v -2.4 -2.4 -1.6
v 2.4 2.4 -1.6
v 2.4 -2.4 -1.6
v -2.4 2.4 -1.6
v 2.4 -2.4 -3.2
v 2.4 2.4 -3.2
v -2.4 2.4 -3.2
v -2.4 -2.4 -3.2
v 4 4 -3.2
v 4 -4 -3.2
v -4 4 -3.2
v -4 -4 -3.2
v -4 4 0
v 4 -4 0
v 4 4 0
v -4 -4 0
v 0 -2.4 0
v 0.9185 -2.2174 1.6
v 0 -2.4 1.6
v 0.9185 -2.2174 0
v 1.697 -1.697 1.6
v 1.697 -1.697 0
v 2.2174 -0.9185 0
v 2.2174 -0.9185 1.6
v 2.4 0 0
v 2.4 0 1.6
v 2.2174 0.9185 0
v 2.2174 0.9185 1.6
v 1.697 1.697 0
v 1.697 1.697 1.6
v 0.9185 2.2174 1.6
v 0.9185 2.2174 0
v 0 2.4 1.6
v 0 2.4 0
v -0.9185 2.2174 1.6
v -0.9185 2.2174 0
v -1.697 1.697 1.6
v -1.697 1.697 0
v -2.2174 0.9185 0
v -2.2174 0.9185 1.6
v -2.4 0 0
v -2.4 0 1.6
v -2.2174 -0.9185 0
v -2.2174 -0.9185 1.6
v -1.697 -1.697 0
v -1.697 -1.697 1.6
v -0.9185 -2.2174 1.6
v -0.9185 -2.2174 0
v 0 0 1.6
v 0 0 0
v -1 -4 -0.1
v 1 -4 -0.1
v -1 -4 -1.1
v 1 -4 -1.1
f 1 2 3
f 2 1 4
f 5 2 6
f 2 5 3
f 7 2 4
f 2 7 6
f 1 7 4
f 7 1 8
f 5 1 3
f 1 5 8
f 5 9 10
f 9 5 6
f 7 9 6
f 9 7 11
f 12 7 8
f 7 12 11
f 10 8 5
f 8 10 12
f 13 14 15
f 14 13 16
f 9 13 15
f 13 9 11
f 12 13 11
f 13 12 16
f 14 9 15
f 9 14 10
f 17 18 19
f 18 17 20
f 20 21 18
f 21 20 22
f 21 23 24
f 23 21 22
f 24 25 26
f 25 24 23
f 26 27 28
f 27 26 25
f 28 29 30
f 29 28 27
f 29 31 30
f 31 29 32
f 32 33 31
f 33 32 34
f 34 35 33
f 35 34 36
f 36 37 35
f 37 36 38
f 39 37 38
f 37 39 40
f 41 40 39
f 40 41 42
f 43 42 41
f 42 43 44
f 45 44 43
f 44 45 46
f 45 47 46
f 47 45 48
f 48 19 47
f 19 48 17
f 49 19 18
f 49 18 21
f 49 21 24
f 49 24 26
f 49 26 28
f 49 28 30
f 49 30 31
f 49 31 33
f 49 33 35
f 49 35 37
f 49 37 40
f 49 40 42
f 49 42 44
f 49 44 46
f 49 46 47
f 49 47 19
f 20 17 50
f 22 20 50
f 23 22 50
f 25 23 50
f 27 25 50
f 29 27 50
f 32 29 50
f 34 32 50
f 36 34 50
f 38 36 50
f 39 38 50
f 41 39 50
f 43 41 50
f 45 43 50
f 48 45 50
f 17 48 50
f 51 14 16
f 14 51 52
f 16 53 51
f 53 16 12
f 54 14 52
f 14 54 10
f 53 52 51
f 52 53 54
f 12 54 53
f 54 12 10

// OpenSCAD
// file: ../p/4-4edge.scad
use <../lib.scad>
function ldraw_lib__4_4edge() = [
// 0 Circle 1.0
// 0 Name: 4-4edge.dat
// 0 Author: James Jessiman
// 0 !LDRAW_ORG Primitive UPDATE 2017-01
// 0 !LICENSE Licensed under CC BY 2.0 and CC BY 4.0 : see CAreadme.txt
// 
// 0 BFC CERTIFY CCW
  [0,"BFC","CERTIFY"],
  [0,"BFC","CCW"],
// 
// 0 !HISTORY 1998-12-15 [PTadmin] Official Update 1998-10
// 0 !HISTORY 2005-12-28 [PTadmin] Official Update 2005-01
// 0 !HISTORY 2007-06-24 [PTadmin] Header formatted for Contributor Agreement
// 0 !HISTORY 2008-07-01 [PTadmin] Official Update 2008-01
// 0 !HISTORY 2017-01-15 [Steffen] BFCed
// 0 !HISTORY 2017-12-30 [PTadmin] Official Update 2017-01
// 
// 
// 2 24 1 0 0 0.9239 0 0.3827
  [2,24,1,0,0,0.9239,0,0.3827],
// 2 24 0.9239 0 0.3827 0.7071 0 0.7071
  [2,24,0.9239,0,0.3827,0.7071,0,0.7071],
// 2 24 0.7071 0 0.7071 0.3827 0 0.9239
  [2,24,0.7071,0,0.7071,0.3827,0,0.9239],
// 2 24 0.3827 0 0.9239 0 0 1
  [2,24,0.3827,0,0.9239,0,0,1],
// 2 24 0 0 1 -0.3827 0 0.9239
  [2,24,0,0,1,-0.3827,0,0.9239],
// 2 24 -0.3827 0 0.9239 -0.7071 0 0.7071
  [2,24,-0.3827,0,0.9239,-0.7071,0,0.7071],
// 2 24 -0.7071 0 0.7071 -0.9239 0 0.3827
  [2,24,-0.7071,0,0.7071,-0.9239,0,0.3827],
// 2 24 -0.9239 0 0.3827 -1 0 -0
  [2,24,-0.9239,0,0.3827,-1,0,-0],
// 2 24 -1 0 -0 -0.9239 0 -0.3827
  [2,24,-1,0,-0,-0.9239,0,-0.3827],
// 2 24 -0.9239 0 -0.3827 -0.7071 0 -0.7071
  [2,24,-0.9239,0,-0.3827,-0.7071,0,-0.7071],
// 2 24 -0.7071 0 -0.7071 -0.3827 0 -0.9239
  [2,24,-0.7071,0,-0.7071,-0.3827,0,-0.9239],
// 2 24 -0.3827 0 -0.9239 0 0 -1
  [2,24,-0.3827,0,-0.9239,0,0,-1],
// 2 24 0 0 -1 0.3827 0 -0.9239
  [2,24,0,0,-1,0.3827,0,-0.9239],
// 2 24 0.3827 0 -0.9239 0.7071 0 -0.7071
  [2,24,0.3827,0,-0.9239,0.7071,0,-0.7071],
// 2 24 0.7071 0 -0.7071 0.9239 0 -0.3827
  [2,24,0.7071,0,-0.7071,0.9239,0,-0.3827],
// 2 24 0.9239 0 -0.3827 1 0 0
  [2,24,0.9239,0,-0.3827,1,0,0],
];
module ldraw_lib__4_4edge(step=0, col=false, unit=2/5, alt=false, line=0.2, solid=!$preview)
    makepoly(ldraw_lib__4_4edge(), step=step, col=col, unit=unit, alt=alt, line=line, solid=solid);
ldraw_lib__4_4edge(line=0.2);
// file: ../p/4-4disc.scad
use <../lib.scad>
function ldraw_lib__4_4disc() = [
// 0 Disc 1.0
// 0 Name: 4-4disc.dat
// 0 Author: James Jessiman
// 0 !LDRAW_ORG Primitive UPDATE 2002-02
// 0 !LICENSE Licensed under CC BY 2.0 and CC BY 4.0 : see CAreadme.txt
// 
// 0 BFC CERTIFY CCW
  [0,"BFC","CERTIFY"],
  [0,"BFC","CCW"],
// 
// 0 !HISTORY 1998-12-15 [PTadmin] Official Update 1998-10
// 0 !HISTORY 2002-03-23 [sbliss] Added BFC statement
// 0 !HISTORY 2002-04-25 [PTadmin] Official Update 2002-02
// 0 !HISTORY 2007-06-24 [PTadmin] Header formatted for Contributor Agreement
// 0 !HISTORY 2008-07-01 [PTadmin] Official Update 2008-01
// 
// 
// 3 16 0 0 0 1 0 0 0.9239 0 0.3827
  [3,16,0,0,0,1,0,0,0.9239,0,0.3827],
// 3 16 0 0 0 0.9239 0 0.3827 0.7071 0 0.7071
  [3,16,0,0,0,0.9239,0,0.3827,0.7071,0,0.7071],
// 3 16 0 0 0 0.7071 0 0.7071 0.3827 0 0.9239
  [3,16,0,0,0,0.7071,0,0.7071,0.3827,0,0.9239],
// 3 16 0 0 0 0.3827 0 0.9239 0 0 1
  [3,16,0,0,0,0.3827,0,0.9239,0,0,1],
// 3 16 0 0 0 0 0 1 -0.3827 0 0.9239
  [3,16,0,0,0,0,0,1,-0.3827,0,0.9239],
// 3 16 0 0 0 -0.3827 0 0.9239 -0.7071 0 0.7071
  [3,16,0,0,0,-0.3827,0,0.9239,-0.7071,0,0.7071],
// 3 16 0 0 0 -0.7071 0 0.7071 -0.9239 0 0.3827
  [3,16,0,0,0,-0.7071,0,0.7071,-0.9239,0,0.3827],
// 3 16 0 0 0 -0.9239 0 0.3827 -1 0 -0
  [3,16,0,0,0,-0.9239,0,0.3827,-1,0,-0],
// 3 16 0 0 0 -1 0 -0 -0.9239 0 -0.3827
  [3,16,0,0,0,-1,0,-0,-0.9239,0,-0.3827],
// 3 16 0 0 0 -0.9239 0 -0.3827 -0.7071 0 -0.7071
  [3,16,0,0,0,-0.9239,0,-0.3827,-0.7071,0,-0.7071],
// 3 16 0 0 0 -0.7071 0 -0.7071 -0.3827 0 -0.9239
  [3,16,0,0,0,-0.7071,0,-0.7071,-0.3827,0,-0.9239],
// 3 16 0 0 0 -0.3827 0 -0.9239 0 0 -1
  [3,16,0,0,0,-0.3827,0,-0.9239,0,0,-1],
// 3 16 0 0 0 0 0 -1 0.3827 0 -0.9239
  [3,16,0,0,0,0,0,-1,0.3827,0,-0.9239],
// 3 16 0 0 0 0.3827 0 -0.9239 0.7071 0 -0.7071
  [3,16,0,0,0,0.3827,0,-0.9239,0.7071,0,-0.7071],
// 3 16 0 0 0 0.7071 0 -0.7071 0.9239 0 -0.3827
  [3,16,0,0,0,0.7071,0,-0.7071,0.9239,0,-0.3827],
// 3 16 0 0 0 0.9239 0 -0.3827 1 0 0
  [3,16,0,0,0,0.9239,0,-0.3827,1,0,0],
// 0
];
module ldraw_lib__4_4disc(step=0, col=false, unit=2/5, alt=false, line=0.2, solid=!$preview)
    makepoly(ldraw_lib__4_4disc(), step=step, col=col, unit=unit, alt=alt, line=line, solid=solid);
ldraw_lib__4_4disc(line=0.2);
// file: ../p/4-4cyli.scad
use <../lib.scad>
$fa=1; $fs=0.2;
function ldraw_lib__4_4cyli(realsolid=false) = [
// 0 Cylinder 1.0
// 0 Name: 4-4cyli.dat
// 0 Author: James Jessiman
// 0 !LDRAW_ORG Primitive UPDATE 2005-01
// 0 !LICENSE Licensed under CC BY 2.0 and CC BY 4.0 : see CAreadme.txt
// 
// 0 BFC CERTIFY CCW
  [0,"BFC","CERTIFY"],
  [0,"BFC","CCW"],
// 
// 0 !HISTORY 1998-12-15 [PTadmin] Official Update 1998-10
// 0 !HISTORY 2002-03-23 [sbliss] Added BFC statement; merged headers from files in distributions LDraw 0.27 and Complete.
// 0 !HISTORY 2002-04-25 [PTadmin] Official Update 2002-02
// 0 !HISTORY 2004-12-14 [guyvivan] BFC CCW
// 0 !HISTORY 2005-12-28 [PTadmin] Official Update 2005-01
// 0 !HISTORY 2007-06-24 [PTadmin] Header formatted for Contributor Agreement
// 0 !HISTORY 2008-07-01 [PTadmin] Official Update 2008-01
// 
// 
// 4 16 1 1 0 0.9239 1 0.3827 0.9239 0 0.3827 1 0 0
  [4,16,1,1,0,0.9239,1,0.3827,0.9239,0,0.3827,1,0,0],
// 5 24 1 0 0 1 1 0 0.9239 0 0.3827 0.9239 0 -0.3827
  [5,24,1,0,0,1,1,0,0.9239,0,0.3827,0.9239,0,-0.3827],
// 4 16 0.9239 1 0.3827 0.7071 1 0.7071 0.7071 0 0.7071 0.9239 0 0.3827
  [4,16,0.9239,1,0.3827,0.7071,1,0.7071,0.7071,0,0.7071,0.9239,0,0.3827],
// 5 24 0.9239 0 0.3827 0.9239 1 0.3827 0.7071 0 0.7071 1 0 0
  [5,24,0.9239,0,0.3827,0.9239,1,0.3827,0.7071,0,0.7071,1,0,0],
// 4 16 0.7071 1 0.7071 0.3827 1 0.9239 0.3827 0 0.9239 0.7071 0 0.7071
  [4,16,0.7071,1,0.7071,0.3827,1,0.9239,0.3827,0,0.9239,0.7071,0,0.7071],
// 5 24 0.7071 0 0.7071 0.7071 1 0.7071 0.3827 0 0.9239 0.9239 0 0.3827
  [5,24,0.7071,0,0.7071,0.7071,1,0.7071,0.3827,0,0.9239,0.9239,0,0.3827],
// 4 16 0.3827 1 0.9239 0 1 1 0 0 1 0.3827 0 0.9239
  [4,16,0.3827,1,0.9239,0,1,1,0,0,1,0.3827,0,0.9239],
// 5 24 0.3827 0 0.9239 0.3827 1 0.9239 0 0 1 0.7071 0 0.7071
  [5,24,0.3827,0,0.9239,0.3827,1,0.9239,0,0,1,0.7071,0,0.7071],
// 4 16 0 1 1 -0.3827 1 0.9239 -0.3827 0 0.9239 0 0 1
  [4,16,0,1,1,-0.3827,1,0.9239,-0.3827,0,0.9239,0,0,1],
// 5 24 0 0 1 0 1 1 -0.3827 0 0.9239 0.3827 0 0.9239
  [5,24,0,0,1,0,1,1,-0.3827,0,0.9239,0.3827,0,0.9239],
// 4 16 -0.3827 1 0.9239 -0.7071 1 0.7071 -0.7071 0 0.7071 -0.3827 0 0.9239
  [4,16,-0.3827,1,0.9239,-0.7071,1,0.7071,-0.7071,0,0.7071,-0.3827,0,0.9239],
// 5 24 -0.3827 0 0.9239 -0.3827 1 0.9239 -0.7071 0 0.7071 0 0 1
  [5,24,-0.3827,0,0.9239,-0.3827,1,0.9239,-0.7071,0,0.7071,0,0,1],
// 4 16 -0.7071 1 0.7071 -0.9239 1 0.3827 -0.9239 0 0.3827 -0.7071 0 0.7071
  [4,16,-0.7071,1,0.7071,-0.9239,1,0.3827,-0.9239,0,0.3827,-0.7071,0,0.7071],
// 5 24 -0.7071 0 0.7071 -0.7071 1 0.7071 -0.9239 0 0.3827 -0.3827 0 0.9239
  [5,24,-0.7071,0,0.7071,-0.7071,1,0.7071,-0.9239,0,0.3827,-0.3827,0,0.9239],
// 4 16 -0.9239 1 0.3827 -1 1 0 -1 0 0 -0.9239 0 0.3827
  [4,16,-0.9239,1,0.3827,-1,1,0,-1,0,0,-0.9239,0,0.3827],
// 5 24 -0.9239 0 0.3827 -0.9239 1 0.3827 -1 0 0 -0.7071 0 0.7071
  [5,24,-0.9239,0,0.3827,-0.9239,1,0.3827,-1,0,0,-0.7071,0,0.7071],
// 4 16 -1 1 0 -0.9239 1 -0.3827 -0.9239 0 -0.3827 -1 0 0
  [4,16,-1,1,0,-0.9239,1,-0.3827,-0.9239,0,-0.3827,-1,0,0],
// 5 24 -1 0 0 -1 1 0 -0.9239 0 -0.3827 -0.9239 0 0.3827
  [5,24,-1,0,0,-1,1,0,-0.9239,0,-0.3827,-0.9239,0,0.3827],
// 4 16 -0.9239 1 -0.3827 -0.7071 1 -0.7071 -0.7071 0 -0.7071 -0.9239 0 -0.3827
  [4,16,-0.9239,1,-0.3827,-0.7071,1,-0.7071,-0.7071,0,-0.7071,-0.9239,0,-0.3827],
// 5 24 -0.9239 0 -0.3827 -0.9239 1 -0.3827 -0.7071 0 -0.7071 -1 0 0
  [5,24,-0.9239,0,-0.3827,-0.9239,1,-0.3827,-0.7071,0,-0.7071,-1,0,0],
// 4 16 -0.7071 1 -0.7071 -0.3827 1 -0.9239 -0.3827 0 -0.9239 -0.7071 0 -0.7071
  [4,16,-0.7071,1,-0.7071,-0.3827,1,-0.9239,-0.3827,0,-0.9239,-0.7071,0,-0.7071],
// 5 24 -0.7071 0 -0.7071 -0.7071 1 -0.7071 -0.3827 0 -0.9239 -0.9239 0 -0.3827
  [5,24,-0.7071,0,-0.7071,-0.7071,1,-0.7071,-0.3827,0,-0.9239,-0.9239,0,-0.3827],
// 4 16 -0.3827 1 -0.9239 0 1 -1 0 0 -1 -0.3827 0 -0.9239
  [4,16,-0.3827,1,-0.9239,0,1,-1,0,0,-1,-0.3827,0,-0.9239],
// 5 24 -0.3827 0 -0.9239 -0.3827 1 -0.9239 0 0 -1 -0.7071 0 -0.7071
  [5,24,-0.3827,0,-0.9239,-0.3827,1,-0.9239,0,0,-1,-0.7071,0,-0.7071],
// 4 16 0 1 -1 0.3827 1 -0.9239 0.3827 0 -0.9239 0 0 -1
  [4,16,0,1,-1,0.3827,1,-0.9239,0.3827,0,-0.9239,0,0,-1],
// 5 24 0 0 -1 0 1 -1 0.3827 0 -0.9239 -0.3827 0 -0.9239
  [5,24,0,0,-1,0,1,-1,0.3827,0,-0.9239,-0.3827,0,-0.9239],
// 4 16 0.3827 1 -0.9239 0.7071 1 -0.7071 0.7071 0 -0.7071 0.3827 0 -0.9239
  [4,16,0.3827,1,-0.9239,0.7071,1,-0.7071,0.7071,0,-0.7071,0.3827,0,-0.9239],
// 5 24 0.3827 0 -0.9239 0.3827 1 -0.9239 0.7071 0 -0.7071 0 0 -1
  [5,24,0.3827,0,-0.9239,0.3827,1,-0.9239,0.7071,0,-0.7071,0,0,-1],
// 4 16 0.7071 1 -0.7071 0.9239 1 -0.3827 0.9239 0 -0.3827 0.7071 0 -0.7071
  [4,16,0.7071,1,-0.7071,0.9239,1,-0.3827,0.9239,0,-0.3827,0.7071,0,-0.7071],
// 5 24 0.7071 0 -0.7071 0.7071 1 -0.7071 0.9239 0 -0.3827 0.3827 0 -0.9239
  [5,24,0.7071,0,-0.7071,0.7071,1,-0.7071,0.9239,0,-0.3827,0.3827,0,-0.9239],
// 4 16 0.9239 1 -0.3827 1 1 0 1 0 0 0.9239 0 -0.3827
  [4,16,0.9239,1,-0.3827,1,1,0,1,0,0,0.9239,0,-0.3827],
// 5 24 0.9239 0 -0.3827 0.9239 1 -0.3827 1 0 0 0.7071 0 -0.7071
  [5,24,0.9239,0,-0.3827,0.9239,1,-0.3827,1,0,0,0.7071,0,-0.7071],
// 0
];
module ldraw_lib__4_4cyli(step=0, col=false, unit=2/5, alt=false, line=0.2, solid=!$preview)
    makepoly(ldraw_lib__4_4cyli(solid), step=step, col=col, unit=unit, alt=alt, line=line, solid=solid);
ldraw_lib__4_4cyli(line=0.2);
// file: ../p/stud.scad
use <../lib.scad>
use <4-4cyli.scad>
use <4-4disc.scad>
use <4-4edge.scad>
function ldraw_lib__stud() = [
// 0 Stud
// 0 Name: stud.dat
// 0 Author: James Jessiman
// 0 !LDRAW_ORG Primitive UPDATE 2012-01
// 0 !LICENSE Licensed under CC BY 4.0 : see CAreadme.txt
// 
// 0 BFC CERTIFY CCW
  [0,"BFC","CERTIFY"],
  [0,"BFC","CCW"],
// 
// 0 !HISTORY 2002-04-04 [sbliss] Modified for BFC compliance
// 0 !HISTORY 2002-04-25 [PTadmin] Official Update 2002-02
// 0 !HISTORY 2007-06-24 [PTadmin] Header formatted for Contributor Agreement
// 0 !HISTORY 2008-07-01 [PTadmin] Official Update 2008-01
// 0 !HISTORY 2012-02-16 [Philo] Changed to CCW
// 0 !HISTORY 2012-03-30 [PTadmin] Official Update 2012-01
// 
// 
// 1 16 0 0 0 6 0 0 0 1 0 0 0 6 4-4edge.dat
  [1,16,0,0,0,6,0,0,0,1,0,0,0,6, ldraw_lib__4_4edge()],
// 1 16 0 -4 0 6 0 0 0 1 0 0 0 6 4-4edge.dat
  [1,16,0,-4,0,6,0,0,0,1,0,0,0,6, ldraw_lib__4_4edge()],
// 1 16 0 0 0 6 0 0 0 -4 0 0 0 6 4-4cyli.dat
  [1,16,0,0,0,6,0,0,0,-4,0,0,0,6, ldraw_lib__4_4cyli()],
// 1 16 0 -4 0 6 0 0 0 1 0 0 0 6 4-4disc.dat
  [1,16,0,-4,0,6,0,0,0,1,0,0,0,6, ldraw_lib__4_4disc()],
  [-1,16,0,0,0,6,0,0,0,-1,0,0,0,6, ldraw_lib__4_4disc()],
];
module ldraw_lib__stud(step=0, col=false, unit=2/5, alt=false, line=0.2, solid=!$preview)
    makepoly(ldraw_lib__stud(), step=step, col=col, unit=unit, alt=alt, line=line, solid=solid);
ldraw_lib__stud(line=0.2);
// file: ../p/box5.scad
use <../lib.scad>
function ldraw_lib__box5() = [
// 0 Box with 5 Faces and All Edges
// 0 Name: box5.dat
// 0 Author: James Jessiman
// 0 !LDRAW_ORG Primitive UPDATE 2012-01
// 0 !LICENSE Licensed under CC BY 2.0 and CC BY 4.0 : see CAreadme.txt
// 
// 0 BFC CERTIFY CCW
  [0,"BFC","CERTIFY"],
  [0,"BFC","CCW"],
// 
// 0 !HISTORY 2002-04-03 [sbliss] Modified for BFC compliance
// 0 !HISTORY 2002-04-25 [PTadmin] Official Update 2002-02
// 0 !HISTORY 2007-06-24 [PTadmin] Header formatted for Contributor Agreement
// 0 !HISTORY 2008-07-01 [PTadmin] Official Update 2008-01
// 0 !HISTORY 2012-02-16 [Philo] Changed to CCW
// 0 !HISTORY 2012-03-30 [PTadmin] Official Update 2012-01
// 
// 
// 2 24 1 1 1 -1 1 1
  [2,24,1,1,1,-1,1,1],
// 2 24 -1 1 1 -1 1 -1
  [2,24,-1,1,1,-1,1,-1],
// 2 24 -1 1 -1 1 1 -1
  [2,24,-1,1,-1,1,1,-1],
// 2 24 1 1 -1 1 1 1
  [2,24,1,1,-1,1,1,1],
// 2 24 1 0 1 -1 0 1
  [2,24,1,0,1,-1,0,1],
// 2 24 -1 0 1 -1 0 -1
  [2,24,-1,0,1,-1,0,-1],
// 2 24 -1 0 -1 1 0 -1
  [2,24,-1,0,-1,1,0,-1],
// 2 24 1 0 -1 1 0 1
  [2,24,1,0,-1,1,0,1],
// 2 24 1 0 1 1 1 1
  [2,24,1,0,1,1,1,1],
// 2 24 -1 0 1 -1 1 1
  [2,24,-1,0,1,-1,1,1],
// 2 24 1 0 -1 1 1 -1
  [2,24,1,0,-1,1,1,-1],
// 2 24 -1 0 -1 -1 1 -1
  [2,24,-1,0,-1,-1,1,-1],
// 4 16 -1 1 1 1 1 1 1 1 -1 -1 1 -1
  [4,16,-1,1,1,1,1,1,1,1,-1,-1,1,-1],
// 4 16 -1 1 1 -1 0 1 1 0 1 1 1 1
  [4,16,-1,1,1,-1,0,1,1,0,1,1,1,1],
// 4 16 -1 1 -1 -1 0 -1 -1 0 1 -1 1 1
  [4,16,-1,1,-1,-1,0,-1,-1,0,1,-1,1,1],
// 4 16 1 1 -1 1 0 -1 -1 0 -1 -1 1 -1
  [4,16,1,1,-1,1,0,-1,-1,0,-1,-1,1,-1],
// 4 16 1 1 1 1 0 1 1 0 -1 1 1 -1
  [4,16,1,1,1,1,0,1,1,0,-1,1,1,-1],
];
makepoly(ldraw_lib__box5(), line=0.2);
// file: ../p/box4t.scad
use <../lib.scad>
function ldraw_lib__box4t() = [
// 0 Box with 4 Adjacent Faces and All Edges
// 0 Name: box4t.dat
// 0 Author: Tore Eriksson [Tore_Eriksson]
// 0 !LDRAW_ORG Primitive UPDATE 2003-02
// 0 !LICENSE Licensed under CC BY 2.0 and CC BY 4.0 : see CAreadme.txt
// 
// 0 BFC CERTIFY CCW
  [0,"BFC","CERTIFY"],
  [0,"BFC","CCW"],
// 
// 0 !HISTORY 1997-09-29 [PTadmin] Official Update 1997-15
// 0 !HISTORY 2002-08-31 [izanette] Modified with WINDZ for BFC compliance
// 0 !HISTORY 2003-08-01 [PTadmin] Official Update 2003-02
// 0 !HISTORY 2007-06-24 [PTadmin] Header formatted for Contributor Agreement
// 0 !HISTORY 2008-07-01 [PTadmin] Official Update 2008-01
// 
// 
// 2 24 1 1 1 -1 1 1
  [2,24,1,1,1,-1,1,1],
// 2 24 -1 1 1 -1 1 -1
  [2,24,-1,1,1,-1,1,-1],
// 2 24 -1 1 -1 1 1 -1
  [2,24,-1,1,-1,1,1,-1],
// 2 24 1 1 -1 1 1 1
  [2,24,1,1,-1,1,1,1],
// 2 24 1 0 1 -1 0 1
  [2,24,1,0,1,-1,0,1],
// 2 24 -1 0 1 -1 0 -1
  [2,24,-1,0,1,-1,0,-1],
// 2 24 -1 0 -1 1 0 -1
  [2,24,-1,0,-1,1,0,-1],
// 2 24 1 0 -1 1 0 1
  [2,24,1,0,-1,1,0,1],
// 2 24 1 0 1 1 1 1
  [2,24,1,0,1,1,1,1],
// 2 24 -1 0 1 -1 1 1
  [2,24,-1,0,1,-1,1,1],
// 2 24 1 0 -1 1 1 -1
  [2,24,1,0,-1,1,1,-1],
// 2 24 -1 0 -1 -1 1 -1
  [2,24,-1,0,-1,-1,1,-1],
// 4 16 1 1 1 1 1 -1 -1 1 -1 -1 1 1
  [4,16,1,1,1,1,1,-1,-1,1,-1,-1,1,1],
// 4 16 1 1 1 -1 1 1 -1 0 1 1 0 1
  [4,16,1,1,1,-1,1,1,-1,0,1,1,0,1],
// 4 16 -1 1 1 -1 1 -1 -1 0 -1 -1 0 1
  [4,16,-1,1,1,-1,1,-1,-1,0,-1,-1,0,1],
// 0 4 16 -1 1 -1 -1 0 -1 1 0 -1 1 1 -1
// 4 16 1 1 -1 1 1 1 1 0 1 1 0 -1
  [4,16,1,1,-1,1,1,1,1,0,1,1,0,-1],
// 0
];
makepoly(ldraw_lib__box4t(), line=0.2);
// file: s/3024s01.scad
use <../../lib.scad>
use <../../p/box4t.scad>
use <../../p/box5.scad>
use <../../p/stud.scad>
function ldraw_lib__s__3024s01() = [
// 0 ~Plate  1 x  1 without Front Face
// 0 Name: s\3024s01.dat
// 0 Author: Tore Eriksson [Tore_Eriksson]
// 0 !LDRAW_ORG Subpart UPDATE 2012-03
// 0 !LICENSE Licensed under CC BY 2.0 and CC BY 4.0 : see CAreadme.txt
// 
// 0 BFC CERTIFY CCW
  [0,"BFC","CERTIFY"],
  [0,"BFC","CCW"],
// 
// 0 !HISTORY 2012-12-28 [PTadmin] Official Update 2012-03
// 
// 
// 0 BFC INVERTNEXT
  [0,"BFC","INVERTNEXT"],
// 1 16 0 8 0 0 0 6 0 -4 0 -6 0 0 box5.dat
  [1,16,0,8,0,0,0,6,0,-4,0,-6,0,0, ldraw_lib__box5()],
// 4 16 10 8 -10 6 8 -6 6 8 6 10 8 10
  [4,16,10,8,-10,6,8,-6,6,8,6,10,8,10],
// 4 16 10 8 10 6 8 6 -6 8 6 -10 8 10
  [4,16,10,8,10,6,8,6,-6,8,6,-10,8,10],
// 4 16 -10 8 10 -6 8 6 -6 8 -6 -10 8 -10
  [4,16,-10,8,10,-6,8,6,-6,8,-6,-10,8,-10],
// 4 16 -10 8 -10 -6 8 -6 6 8 -6 10 8 -10
  [4,16,-10,8,-10,-6,8,-6,6,8,-6,10,8,-10],
// 1 16 0 8 0 10 0 0 0 -8 0 0 0 10 box4t.dat
  [1,16,0,8,0,10,0,0,0,-8,0,0,0,10, ldraw_lib__box4t()],
// 1 16 0 0 0 0 0 1 0 1 0 -1 0 0 stud.dat
  [1,16,0,0,0,0,0,1,0,1,0,-1,0,0, ldraw_lib__stud()],
];
module ldraw_lib__s__3024s01(step=0, col=false, unit=2/5, alt=false, line=0.2, solid=!$preview)
    makepoly(ldraw_lib__s__3024s01(), step=step, col=col, unit=unit, alt=alt, line=line, solid=solid);
ldraw_lib__s__3024s01(line=0.2);
// main file
use <../lib.scad>
use <s/3024s01.scad>
function ldraw_lib__3024ptc5() = [
// 0 Plate  1 x  1 with Minecraft Micro Mob Zombie Mouth Pattern
// 0 Name: 3024ptc5.dat
// 0 Author: Philippe Hurbain [Philo]
// 0 !LDRAW_ORG Part UPDATE 2014-01
// 0 !LICENSE Licensed under CC BY 4.0 : see CAreadme.txt
// 
// 0 BFC CERTIFY CCW
  [0,"BFC","CERTIFY"],
  [0,"BFC","CCW"],
// 
// 0 !KEYWORDS BrickLink 3024pb006, Rebrickable 3024pr0006
// 
// 0 !HISTORY 2014-06-21 [PTadmin] Official Update 2014-01
// 
// 
// 1 16 0 0 0 1 0 0 0 1 0 0 0 1 s\3024s01.dat
  [1,16,0,0,0,1,0,0,0,1,0,0,0,1, ldraw_lib__s__3024s01()],
// 4 16 10 0 -10 -10 0 -10 -2.5 0.25 -10 2.5 0.25 -10
  [4,16,10,0,-10,-10,0,-10,-2.5,0.25,-10,2.5,0.25,-10],
// 4 16 -2.5 2.75 -10 -2.5 0.25 -10 -10 0 -10 -10 8 -10
  [4,16,-2.5,2.75,-10,-2.5,0.25,-10,-10,0,-10,-10,8,-10],
// 4 16 10 0 -10 2.5 0.25 -10 2.5 2.75 -10 10 8 -10
  [4,16,10,0,-10,2.5,0.25,-10,2.5,2.75,-10,10,8,-10],
// 4 0 -2.5 0.25 -10 -2.5 2.75 -10 2.5 2.75 -10 2.5 0.25 -10
  [4,0,-2.5,0.25,-10,-2.5,2.75,-10,2.5,2.75,-10,2.5,0.25,-10],
// 4 16 2.5 2.75 -10 -2.5 2.75 -10 -10 8 -10 10 8 -10
  [4,16,2.5,2.75,-10,-2.5,2.75,-10,-10,8,-10,10,8,-10],
];
module ldraw_lib__3024ptc5(step=0, col=false, unit=2/5, alt=false, line=0.2, solid=!$preview)
    makepoly(ldraw_lib__3024ptc5(), step=step, col=col, unit=unit, alt=alt, line=line, solid=solid);
ldraw_lib__3024ptc5(line=0.2);
